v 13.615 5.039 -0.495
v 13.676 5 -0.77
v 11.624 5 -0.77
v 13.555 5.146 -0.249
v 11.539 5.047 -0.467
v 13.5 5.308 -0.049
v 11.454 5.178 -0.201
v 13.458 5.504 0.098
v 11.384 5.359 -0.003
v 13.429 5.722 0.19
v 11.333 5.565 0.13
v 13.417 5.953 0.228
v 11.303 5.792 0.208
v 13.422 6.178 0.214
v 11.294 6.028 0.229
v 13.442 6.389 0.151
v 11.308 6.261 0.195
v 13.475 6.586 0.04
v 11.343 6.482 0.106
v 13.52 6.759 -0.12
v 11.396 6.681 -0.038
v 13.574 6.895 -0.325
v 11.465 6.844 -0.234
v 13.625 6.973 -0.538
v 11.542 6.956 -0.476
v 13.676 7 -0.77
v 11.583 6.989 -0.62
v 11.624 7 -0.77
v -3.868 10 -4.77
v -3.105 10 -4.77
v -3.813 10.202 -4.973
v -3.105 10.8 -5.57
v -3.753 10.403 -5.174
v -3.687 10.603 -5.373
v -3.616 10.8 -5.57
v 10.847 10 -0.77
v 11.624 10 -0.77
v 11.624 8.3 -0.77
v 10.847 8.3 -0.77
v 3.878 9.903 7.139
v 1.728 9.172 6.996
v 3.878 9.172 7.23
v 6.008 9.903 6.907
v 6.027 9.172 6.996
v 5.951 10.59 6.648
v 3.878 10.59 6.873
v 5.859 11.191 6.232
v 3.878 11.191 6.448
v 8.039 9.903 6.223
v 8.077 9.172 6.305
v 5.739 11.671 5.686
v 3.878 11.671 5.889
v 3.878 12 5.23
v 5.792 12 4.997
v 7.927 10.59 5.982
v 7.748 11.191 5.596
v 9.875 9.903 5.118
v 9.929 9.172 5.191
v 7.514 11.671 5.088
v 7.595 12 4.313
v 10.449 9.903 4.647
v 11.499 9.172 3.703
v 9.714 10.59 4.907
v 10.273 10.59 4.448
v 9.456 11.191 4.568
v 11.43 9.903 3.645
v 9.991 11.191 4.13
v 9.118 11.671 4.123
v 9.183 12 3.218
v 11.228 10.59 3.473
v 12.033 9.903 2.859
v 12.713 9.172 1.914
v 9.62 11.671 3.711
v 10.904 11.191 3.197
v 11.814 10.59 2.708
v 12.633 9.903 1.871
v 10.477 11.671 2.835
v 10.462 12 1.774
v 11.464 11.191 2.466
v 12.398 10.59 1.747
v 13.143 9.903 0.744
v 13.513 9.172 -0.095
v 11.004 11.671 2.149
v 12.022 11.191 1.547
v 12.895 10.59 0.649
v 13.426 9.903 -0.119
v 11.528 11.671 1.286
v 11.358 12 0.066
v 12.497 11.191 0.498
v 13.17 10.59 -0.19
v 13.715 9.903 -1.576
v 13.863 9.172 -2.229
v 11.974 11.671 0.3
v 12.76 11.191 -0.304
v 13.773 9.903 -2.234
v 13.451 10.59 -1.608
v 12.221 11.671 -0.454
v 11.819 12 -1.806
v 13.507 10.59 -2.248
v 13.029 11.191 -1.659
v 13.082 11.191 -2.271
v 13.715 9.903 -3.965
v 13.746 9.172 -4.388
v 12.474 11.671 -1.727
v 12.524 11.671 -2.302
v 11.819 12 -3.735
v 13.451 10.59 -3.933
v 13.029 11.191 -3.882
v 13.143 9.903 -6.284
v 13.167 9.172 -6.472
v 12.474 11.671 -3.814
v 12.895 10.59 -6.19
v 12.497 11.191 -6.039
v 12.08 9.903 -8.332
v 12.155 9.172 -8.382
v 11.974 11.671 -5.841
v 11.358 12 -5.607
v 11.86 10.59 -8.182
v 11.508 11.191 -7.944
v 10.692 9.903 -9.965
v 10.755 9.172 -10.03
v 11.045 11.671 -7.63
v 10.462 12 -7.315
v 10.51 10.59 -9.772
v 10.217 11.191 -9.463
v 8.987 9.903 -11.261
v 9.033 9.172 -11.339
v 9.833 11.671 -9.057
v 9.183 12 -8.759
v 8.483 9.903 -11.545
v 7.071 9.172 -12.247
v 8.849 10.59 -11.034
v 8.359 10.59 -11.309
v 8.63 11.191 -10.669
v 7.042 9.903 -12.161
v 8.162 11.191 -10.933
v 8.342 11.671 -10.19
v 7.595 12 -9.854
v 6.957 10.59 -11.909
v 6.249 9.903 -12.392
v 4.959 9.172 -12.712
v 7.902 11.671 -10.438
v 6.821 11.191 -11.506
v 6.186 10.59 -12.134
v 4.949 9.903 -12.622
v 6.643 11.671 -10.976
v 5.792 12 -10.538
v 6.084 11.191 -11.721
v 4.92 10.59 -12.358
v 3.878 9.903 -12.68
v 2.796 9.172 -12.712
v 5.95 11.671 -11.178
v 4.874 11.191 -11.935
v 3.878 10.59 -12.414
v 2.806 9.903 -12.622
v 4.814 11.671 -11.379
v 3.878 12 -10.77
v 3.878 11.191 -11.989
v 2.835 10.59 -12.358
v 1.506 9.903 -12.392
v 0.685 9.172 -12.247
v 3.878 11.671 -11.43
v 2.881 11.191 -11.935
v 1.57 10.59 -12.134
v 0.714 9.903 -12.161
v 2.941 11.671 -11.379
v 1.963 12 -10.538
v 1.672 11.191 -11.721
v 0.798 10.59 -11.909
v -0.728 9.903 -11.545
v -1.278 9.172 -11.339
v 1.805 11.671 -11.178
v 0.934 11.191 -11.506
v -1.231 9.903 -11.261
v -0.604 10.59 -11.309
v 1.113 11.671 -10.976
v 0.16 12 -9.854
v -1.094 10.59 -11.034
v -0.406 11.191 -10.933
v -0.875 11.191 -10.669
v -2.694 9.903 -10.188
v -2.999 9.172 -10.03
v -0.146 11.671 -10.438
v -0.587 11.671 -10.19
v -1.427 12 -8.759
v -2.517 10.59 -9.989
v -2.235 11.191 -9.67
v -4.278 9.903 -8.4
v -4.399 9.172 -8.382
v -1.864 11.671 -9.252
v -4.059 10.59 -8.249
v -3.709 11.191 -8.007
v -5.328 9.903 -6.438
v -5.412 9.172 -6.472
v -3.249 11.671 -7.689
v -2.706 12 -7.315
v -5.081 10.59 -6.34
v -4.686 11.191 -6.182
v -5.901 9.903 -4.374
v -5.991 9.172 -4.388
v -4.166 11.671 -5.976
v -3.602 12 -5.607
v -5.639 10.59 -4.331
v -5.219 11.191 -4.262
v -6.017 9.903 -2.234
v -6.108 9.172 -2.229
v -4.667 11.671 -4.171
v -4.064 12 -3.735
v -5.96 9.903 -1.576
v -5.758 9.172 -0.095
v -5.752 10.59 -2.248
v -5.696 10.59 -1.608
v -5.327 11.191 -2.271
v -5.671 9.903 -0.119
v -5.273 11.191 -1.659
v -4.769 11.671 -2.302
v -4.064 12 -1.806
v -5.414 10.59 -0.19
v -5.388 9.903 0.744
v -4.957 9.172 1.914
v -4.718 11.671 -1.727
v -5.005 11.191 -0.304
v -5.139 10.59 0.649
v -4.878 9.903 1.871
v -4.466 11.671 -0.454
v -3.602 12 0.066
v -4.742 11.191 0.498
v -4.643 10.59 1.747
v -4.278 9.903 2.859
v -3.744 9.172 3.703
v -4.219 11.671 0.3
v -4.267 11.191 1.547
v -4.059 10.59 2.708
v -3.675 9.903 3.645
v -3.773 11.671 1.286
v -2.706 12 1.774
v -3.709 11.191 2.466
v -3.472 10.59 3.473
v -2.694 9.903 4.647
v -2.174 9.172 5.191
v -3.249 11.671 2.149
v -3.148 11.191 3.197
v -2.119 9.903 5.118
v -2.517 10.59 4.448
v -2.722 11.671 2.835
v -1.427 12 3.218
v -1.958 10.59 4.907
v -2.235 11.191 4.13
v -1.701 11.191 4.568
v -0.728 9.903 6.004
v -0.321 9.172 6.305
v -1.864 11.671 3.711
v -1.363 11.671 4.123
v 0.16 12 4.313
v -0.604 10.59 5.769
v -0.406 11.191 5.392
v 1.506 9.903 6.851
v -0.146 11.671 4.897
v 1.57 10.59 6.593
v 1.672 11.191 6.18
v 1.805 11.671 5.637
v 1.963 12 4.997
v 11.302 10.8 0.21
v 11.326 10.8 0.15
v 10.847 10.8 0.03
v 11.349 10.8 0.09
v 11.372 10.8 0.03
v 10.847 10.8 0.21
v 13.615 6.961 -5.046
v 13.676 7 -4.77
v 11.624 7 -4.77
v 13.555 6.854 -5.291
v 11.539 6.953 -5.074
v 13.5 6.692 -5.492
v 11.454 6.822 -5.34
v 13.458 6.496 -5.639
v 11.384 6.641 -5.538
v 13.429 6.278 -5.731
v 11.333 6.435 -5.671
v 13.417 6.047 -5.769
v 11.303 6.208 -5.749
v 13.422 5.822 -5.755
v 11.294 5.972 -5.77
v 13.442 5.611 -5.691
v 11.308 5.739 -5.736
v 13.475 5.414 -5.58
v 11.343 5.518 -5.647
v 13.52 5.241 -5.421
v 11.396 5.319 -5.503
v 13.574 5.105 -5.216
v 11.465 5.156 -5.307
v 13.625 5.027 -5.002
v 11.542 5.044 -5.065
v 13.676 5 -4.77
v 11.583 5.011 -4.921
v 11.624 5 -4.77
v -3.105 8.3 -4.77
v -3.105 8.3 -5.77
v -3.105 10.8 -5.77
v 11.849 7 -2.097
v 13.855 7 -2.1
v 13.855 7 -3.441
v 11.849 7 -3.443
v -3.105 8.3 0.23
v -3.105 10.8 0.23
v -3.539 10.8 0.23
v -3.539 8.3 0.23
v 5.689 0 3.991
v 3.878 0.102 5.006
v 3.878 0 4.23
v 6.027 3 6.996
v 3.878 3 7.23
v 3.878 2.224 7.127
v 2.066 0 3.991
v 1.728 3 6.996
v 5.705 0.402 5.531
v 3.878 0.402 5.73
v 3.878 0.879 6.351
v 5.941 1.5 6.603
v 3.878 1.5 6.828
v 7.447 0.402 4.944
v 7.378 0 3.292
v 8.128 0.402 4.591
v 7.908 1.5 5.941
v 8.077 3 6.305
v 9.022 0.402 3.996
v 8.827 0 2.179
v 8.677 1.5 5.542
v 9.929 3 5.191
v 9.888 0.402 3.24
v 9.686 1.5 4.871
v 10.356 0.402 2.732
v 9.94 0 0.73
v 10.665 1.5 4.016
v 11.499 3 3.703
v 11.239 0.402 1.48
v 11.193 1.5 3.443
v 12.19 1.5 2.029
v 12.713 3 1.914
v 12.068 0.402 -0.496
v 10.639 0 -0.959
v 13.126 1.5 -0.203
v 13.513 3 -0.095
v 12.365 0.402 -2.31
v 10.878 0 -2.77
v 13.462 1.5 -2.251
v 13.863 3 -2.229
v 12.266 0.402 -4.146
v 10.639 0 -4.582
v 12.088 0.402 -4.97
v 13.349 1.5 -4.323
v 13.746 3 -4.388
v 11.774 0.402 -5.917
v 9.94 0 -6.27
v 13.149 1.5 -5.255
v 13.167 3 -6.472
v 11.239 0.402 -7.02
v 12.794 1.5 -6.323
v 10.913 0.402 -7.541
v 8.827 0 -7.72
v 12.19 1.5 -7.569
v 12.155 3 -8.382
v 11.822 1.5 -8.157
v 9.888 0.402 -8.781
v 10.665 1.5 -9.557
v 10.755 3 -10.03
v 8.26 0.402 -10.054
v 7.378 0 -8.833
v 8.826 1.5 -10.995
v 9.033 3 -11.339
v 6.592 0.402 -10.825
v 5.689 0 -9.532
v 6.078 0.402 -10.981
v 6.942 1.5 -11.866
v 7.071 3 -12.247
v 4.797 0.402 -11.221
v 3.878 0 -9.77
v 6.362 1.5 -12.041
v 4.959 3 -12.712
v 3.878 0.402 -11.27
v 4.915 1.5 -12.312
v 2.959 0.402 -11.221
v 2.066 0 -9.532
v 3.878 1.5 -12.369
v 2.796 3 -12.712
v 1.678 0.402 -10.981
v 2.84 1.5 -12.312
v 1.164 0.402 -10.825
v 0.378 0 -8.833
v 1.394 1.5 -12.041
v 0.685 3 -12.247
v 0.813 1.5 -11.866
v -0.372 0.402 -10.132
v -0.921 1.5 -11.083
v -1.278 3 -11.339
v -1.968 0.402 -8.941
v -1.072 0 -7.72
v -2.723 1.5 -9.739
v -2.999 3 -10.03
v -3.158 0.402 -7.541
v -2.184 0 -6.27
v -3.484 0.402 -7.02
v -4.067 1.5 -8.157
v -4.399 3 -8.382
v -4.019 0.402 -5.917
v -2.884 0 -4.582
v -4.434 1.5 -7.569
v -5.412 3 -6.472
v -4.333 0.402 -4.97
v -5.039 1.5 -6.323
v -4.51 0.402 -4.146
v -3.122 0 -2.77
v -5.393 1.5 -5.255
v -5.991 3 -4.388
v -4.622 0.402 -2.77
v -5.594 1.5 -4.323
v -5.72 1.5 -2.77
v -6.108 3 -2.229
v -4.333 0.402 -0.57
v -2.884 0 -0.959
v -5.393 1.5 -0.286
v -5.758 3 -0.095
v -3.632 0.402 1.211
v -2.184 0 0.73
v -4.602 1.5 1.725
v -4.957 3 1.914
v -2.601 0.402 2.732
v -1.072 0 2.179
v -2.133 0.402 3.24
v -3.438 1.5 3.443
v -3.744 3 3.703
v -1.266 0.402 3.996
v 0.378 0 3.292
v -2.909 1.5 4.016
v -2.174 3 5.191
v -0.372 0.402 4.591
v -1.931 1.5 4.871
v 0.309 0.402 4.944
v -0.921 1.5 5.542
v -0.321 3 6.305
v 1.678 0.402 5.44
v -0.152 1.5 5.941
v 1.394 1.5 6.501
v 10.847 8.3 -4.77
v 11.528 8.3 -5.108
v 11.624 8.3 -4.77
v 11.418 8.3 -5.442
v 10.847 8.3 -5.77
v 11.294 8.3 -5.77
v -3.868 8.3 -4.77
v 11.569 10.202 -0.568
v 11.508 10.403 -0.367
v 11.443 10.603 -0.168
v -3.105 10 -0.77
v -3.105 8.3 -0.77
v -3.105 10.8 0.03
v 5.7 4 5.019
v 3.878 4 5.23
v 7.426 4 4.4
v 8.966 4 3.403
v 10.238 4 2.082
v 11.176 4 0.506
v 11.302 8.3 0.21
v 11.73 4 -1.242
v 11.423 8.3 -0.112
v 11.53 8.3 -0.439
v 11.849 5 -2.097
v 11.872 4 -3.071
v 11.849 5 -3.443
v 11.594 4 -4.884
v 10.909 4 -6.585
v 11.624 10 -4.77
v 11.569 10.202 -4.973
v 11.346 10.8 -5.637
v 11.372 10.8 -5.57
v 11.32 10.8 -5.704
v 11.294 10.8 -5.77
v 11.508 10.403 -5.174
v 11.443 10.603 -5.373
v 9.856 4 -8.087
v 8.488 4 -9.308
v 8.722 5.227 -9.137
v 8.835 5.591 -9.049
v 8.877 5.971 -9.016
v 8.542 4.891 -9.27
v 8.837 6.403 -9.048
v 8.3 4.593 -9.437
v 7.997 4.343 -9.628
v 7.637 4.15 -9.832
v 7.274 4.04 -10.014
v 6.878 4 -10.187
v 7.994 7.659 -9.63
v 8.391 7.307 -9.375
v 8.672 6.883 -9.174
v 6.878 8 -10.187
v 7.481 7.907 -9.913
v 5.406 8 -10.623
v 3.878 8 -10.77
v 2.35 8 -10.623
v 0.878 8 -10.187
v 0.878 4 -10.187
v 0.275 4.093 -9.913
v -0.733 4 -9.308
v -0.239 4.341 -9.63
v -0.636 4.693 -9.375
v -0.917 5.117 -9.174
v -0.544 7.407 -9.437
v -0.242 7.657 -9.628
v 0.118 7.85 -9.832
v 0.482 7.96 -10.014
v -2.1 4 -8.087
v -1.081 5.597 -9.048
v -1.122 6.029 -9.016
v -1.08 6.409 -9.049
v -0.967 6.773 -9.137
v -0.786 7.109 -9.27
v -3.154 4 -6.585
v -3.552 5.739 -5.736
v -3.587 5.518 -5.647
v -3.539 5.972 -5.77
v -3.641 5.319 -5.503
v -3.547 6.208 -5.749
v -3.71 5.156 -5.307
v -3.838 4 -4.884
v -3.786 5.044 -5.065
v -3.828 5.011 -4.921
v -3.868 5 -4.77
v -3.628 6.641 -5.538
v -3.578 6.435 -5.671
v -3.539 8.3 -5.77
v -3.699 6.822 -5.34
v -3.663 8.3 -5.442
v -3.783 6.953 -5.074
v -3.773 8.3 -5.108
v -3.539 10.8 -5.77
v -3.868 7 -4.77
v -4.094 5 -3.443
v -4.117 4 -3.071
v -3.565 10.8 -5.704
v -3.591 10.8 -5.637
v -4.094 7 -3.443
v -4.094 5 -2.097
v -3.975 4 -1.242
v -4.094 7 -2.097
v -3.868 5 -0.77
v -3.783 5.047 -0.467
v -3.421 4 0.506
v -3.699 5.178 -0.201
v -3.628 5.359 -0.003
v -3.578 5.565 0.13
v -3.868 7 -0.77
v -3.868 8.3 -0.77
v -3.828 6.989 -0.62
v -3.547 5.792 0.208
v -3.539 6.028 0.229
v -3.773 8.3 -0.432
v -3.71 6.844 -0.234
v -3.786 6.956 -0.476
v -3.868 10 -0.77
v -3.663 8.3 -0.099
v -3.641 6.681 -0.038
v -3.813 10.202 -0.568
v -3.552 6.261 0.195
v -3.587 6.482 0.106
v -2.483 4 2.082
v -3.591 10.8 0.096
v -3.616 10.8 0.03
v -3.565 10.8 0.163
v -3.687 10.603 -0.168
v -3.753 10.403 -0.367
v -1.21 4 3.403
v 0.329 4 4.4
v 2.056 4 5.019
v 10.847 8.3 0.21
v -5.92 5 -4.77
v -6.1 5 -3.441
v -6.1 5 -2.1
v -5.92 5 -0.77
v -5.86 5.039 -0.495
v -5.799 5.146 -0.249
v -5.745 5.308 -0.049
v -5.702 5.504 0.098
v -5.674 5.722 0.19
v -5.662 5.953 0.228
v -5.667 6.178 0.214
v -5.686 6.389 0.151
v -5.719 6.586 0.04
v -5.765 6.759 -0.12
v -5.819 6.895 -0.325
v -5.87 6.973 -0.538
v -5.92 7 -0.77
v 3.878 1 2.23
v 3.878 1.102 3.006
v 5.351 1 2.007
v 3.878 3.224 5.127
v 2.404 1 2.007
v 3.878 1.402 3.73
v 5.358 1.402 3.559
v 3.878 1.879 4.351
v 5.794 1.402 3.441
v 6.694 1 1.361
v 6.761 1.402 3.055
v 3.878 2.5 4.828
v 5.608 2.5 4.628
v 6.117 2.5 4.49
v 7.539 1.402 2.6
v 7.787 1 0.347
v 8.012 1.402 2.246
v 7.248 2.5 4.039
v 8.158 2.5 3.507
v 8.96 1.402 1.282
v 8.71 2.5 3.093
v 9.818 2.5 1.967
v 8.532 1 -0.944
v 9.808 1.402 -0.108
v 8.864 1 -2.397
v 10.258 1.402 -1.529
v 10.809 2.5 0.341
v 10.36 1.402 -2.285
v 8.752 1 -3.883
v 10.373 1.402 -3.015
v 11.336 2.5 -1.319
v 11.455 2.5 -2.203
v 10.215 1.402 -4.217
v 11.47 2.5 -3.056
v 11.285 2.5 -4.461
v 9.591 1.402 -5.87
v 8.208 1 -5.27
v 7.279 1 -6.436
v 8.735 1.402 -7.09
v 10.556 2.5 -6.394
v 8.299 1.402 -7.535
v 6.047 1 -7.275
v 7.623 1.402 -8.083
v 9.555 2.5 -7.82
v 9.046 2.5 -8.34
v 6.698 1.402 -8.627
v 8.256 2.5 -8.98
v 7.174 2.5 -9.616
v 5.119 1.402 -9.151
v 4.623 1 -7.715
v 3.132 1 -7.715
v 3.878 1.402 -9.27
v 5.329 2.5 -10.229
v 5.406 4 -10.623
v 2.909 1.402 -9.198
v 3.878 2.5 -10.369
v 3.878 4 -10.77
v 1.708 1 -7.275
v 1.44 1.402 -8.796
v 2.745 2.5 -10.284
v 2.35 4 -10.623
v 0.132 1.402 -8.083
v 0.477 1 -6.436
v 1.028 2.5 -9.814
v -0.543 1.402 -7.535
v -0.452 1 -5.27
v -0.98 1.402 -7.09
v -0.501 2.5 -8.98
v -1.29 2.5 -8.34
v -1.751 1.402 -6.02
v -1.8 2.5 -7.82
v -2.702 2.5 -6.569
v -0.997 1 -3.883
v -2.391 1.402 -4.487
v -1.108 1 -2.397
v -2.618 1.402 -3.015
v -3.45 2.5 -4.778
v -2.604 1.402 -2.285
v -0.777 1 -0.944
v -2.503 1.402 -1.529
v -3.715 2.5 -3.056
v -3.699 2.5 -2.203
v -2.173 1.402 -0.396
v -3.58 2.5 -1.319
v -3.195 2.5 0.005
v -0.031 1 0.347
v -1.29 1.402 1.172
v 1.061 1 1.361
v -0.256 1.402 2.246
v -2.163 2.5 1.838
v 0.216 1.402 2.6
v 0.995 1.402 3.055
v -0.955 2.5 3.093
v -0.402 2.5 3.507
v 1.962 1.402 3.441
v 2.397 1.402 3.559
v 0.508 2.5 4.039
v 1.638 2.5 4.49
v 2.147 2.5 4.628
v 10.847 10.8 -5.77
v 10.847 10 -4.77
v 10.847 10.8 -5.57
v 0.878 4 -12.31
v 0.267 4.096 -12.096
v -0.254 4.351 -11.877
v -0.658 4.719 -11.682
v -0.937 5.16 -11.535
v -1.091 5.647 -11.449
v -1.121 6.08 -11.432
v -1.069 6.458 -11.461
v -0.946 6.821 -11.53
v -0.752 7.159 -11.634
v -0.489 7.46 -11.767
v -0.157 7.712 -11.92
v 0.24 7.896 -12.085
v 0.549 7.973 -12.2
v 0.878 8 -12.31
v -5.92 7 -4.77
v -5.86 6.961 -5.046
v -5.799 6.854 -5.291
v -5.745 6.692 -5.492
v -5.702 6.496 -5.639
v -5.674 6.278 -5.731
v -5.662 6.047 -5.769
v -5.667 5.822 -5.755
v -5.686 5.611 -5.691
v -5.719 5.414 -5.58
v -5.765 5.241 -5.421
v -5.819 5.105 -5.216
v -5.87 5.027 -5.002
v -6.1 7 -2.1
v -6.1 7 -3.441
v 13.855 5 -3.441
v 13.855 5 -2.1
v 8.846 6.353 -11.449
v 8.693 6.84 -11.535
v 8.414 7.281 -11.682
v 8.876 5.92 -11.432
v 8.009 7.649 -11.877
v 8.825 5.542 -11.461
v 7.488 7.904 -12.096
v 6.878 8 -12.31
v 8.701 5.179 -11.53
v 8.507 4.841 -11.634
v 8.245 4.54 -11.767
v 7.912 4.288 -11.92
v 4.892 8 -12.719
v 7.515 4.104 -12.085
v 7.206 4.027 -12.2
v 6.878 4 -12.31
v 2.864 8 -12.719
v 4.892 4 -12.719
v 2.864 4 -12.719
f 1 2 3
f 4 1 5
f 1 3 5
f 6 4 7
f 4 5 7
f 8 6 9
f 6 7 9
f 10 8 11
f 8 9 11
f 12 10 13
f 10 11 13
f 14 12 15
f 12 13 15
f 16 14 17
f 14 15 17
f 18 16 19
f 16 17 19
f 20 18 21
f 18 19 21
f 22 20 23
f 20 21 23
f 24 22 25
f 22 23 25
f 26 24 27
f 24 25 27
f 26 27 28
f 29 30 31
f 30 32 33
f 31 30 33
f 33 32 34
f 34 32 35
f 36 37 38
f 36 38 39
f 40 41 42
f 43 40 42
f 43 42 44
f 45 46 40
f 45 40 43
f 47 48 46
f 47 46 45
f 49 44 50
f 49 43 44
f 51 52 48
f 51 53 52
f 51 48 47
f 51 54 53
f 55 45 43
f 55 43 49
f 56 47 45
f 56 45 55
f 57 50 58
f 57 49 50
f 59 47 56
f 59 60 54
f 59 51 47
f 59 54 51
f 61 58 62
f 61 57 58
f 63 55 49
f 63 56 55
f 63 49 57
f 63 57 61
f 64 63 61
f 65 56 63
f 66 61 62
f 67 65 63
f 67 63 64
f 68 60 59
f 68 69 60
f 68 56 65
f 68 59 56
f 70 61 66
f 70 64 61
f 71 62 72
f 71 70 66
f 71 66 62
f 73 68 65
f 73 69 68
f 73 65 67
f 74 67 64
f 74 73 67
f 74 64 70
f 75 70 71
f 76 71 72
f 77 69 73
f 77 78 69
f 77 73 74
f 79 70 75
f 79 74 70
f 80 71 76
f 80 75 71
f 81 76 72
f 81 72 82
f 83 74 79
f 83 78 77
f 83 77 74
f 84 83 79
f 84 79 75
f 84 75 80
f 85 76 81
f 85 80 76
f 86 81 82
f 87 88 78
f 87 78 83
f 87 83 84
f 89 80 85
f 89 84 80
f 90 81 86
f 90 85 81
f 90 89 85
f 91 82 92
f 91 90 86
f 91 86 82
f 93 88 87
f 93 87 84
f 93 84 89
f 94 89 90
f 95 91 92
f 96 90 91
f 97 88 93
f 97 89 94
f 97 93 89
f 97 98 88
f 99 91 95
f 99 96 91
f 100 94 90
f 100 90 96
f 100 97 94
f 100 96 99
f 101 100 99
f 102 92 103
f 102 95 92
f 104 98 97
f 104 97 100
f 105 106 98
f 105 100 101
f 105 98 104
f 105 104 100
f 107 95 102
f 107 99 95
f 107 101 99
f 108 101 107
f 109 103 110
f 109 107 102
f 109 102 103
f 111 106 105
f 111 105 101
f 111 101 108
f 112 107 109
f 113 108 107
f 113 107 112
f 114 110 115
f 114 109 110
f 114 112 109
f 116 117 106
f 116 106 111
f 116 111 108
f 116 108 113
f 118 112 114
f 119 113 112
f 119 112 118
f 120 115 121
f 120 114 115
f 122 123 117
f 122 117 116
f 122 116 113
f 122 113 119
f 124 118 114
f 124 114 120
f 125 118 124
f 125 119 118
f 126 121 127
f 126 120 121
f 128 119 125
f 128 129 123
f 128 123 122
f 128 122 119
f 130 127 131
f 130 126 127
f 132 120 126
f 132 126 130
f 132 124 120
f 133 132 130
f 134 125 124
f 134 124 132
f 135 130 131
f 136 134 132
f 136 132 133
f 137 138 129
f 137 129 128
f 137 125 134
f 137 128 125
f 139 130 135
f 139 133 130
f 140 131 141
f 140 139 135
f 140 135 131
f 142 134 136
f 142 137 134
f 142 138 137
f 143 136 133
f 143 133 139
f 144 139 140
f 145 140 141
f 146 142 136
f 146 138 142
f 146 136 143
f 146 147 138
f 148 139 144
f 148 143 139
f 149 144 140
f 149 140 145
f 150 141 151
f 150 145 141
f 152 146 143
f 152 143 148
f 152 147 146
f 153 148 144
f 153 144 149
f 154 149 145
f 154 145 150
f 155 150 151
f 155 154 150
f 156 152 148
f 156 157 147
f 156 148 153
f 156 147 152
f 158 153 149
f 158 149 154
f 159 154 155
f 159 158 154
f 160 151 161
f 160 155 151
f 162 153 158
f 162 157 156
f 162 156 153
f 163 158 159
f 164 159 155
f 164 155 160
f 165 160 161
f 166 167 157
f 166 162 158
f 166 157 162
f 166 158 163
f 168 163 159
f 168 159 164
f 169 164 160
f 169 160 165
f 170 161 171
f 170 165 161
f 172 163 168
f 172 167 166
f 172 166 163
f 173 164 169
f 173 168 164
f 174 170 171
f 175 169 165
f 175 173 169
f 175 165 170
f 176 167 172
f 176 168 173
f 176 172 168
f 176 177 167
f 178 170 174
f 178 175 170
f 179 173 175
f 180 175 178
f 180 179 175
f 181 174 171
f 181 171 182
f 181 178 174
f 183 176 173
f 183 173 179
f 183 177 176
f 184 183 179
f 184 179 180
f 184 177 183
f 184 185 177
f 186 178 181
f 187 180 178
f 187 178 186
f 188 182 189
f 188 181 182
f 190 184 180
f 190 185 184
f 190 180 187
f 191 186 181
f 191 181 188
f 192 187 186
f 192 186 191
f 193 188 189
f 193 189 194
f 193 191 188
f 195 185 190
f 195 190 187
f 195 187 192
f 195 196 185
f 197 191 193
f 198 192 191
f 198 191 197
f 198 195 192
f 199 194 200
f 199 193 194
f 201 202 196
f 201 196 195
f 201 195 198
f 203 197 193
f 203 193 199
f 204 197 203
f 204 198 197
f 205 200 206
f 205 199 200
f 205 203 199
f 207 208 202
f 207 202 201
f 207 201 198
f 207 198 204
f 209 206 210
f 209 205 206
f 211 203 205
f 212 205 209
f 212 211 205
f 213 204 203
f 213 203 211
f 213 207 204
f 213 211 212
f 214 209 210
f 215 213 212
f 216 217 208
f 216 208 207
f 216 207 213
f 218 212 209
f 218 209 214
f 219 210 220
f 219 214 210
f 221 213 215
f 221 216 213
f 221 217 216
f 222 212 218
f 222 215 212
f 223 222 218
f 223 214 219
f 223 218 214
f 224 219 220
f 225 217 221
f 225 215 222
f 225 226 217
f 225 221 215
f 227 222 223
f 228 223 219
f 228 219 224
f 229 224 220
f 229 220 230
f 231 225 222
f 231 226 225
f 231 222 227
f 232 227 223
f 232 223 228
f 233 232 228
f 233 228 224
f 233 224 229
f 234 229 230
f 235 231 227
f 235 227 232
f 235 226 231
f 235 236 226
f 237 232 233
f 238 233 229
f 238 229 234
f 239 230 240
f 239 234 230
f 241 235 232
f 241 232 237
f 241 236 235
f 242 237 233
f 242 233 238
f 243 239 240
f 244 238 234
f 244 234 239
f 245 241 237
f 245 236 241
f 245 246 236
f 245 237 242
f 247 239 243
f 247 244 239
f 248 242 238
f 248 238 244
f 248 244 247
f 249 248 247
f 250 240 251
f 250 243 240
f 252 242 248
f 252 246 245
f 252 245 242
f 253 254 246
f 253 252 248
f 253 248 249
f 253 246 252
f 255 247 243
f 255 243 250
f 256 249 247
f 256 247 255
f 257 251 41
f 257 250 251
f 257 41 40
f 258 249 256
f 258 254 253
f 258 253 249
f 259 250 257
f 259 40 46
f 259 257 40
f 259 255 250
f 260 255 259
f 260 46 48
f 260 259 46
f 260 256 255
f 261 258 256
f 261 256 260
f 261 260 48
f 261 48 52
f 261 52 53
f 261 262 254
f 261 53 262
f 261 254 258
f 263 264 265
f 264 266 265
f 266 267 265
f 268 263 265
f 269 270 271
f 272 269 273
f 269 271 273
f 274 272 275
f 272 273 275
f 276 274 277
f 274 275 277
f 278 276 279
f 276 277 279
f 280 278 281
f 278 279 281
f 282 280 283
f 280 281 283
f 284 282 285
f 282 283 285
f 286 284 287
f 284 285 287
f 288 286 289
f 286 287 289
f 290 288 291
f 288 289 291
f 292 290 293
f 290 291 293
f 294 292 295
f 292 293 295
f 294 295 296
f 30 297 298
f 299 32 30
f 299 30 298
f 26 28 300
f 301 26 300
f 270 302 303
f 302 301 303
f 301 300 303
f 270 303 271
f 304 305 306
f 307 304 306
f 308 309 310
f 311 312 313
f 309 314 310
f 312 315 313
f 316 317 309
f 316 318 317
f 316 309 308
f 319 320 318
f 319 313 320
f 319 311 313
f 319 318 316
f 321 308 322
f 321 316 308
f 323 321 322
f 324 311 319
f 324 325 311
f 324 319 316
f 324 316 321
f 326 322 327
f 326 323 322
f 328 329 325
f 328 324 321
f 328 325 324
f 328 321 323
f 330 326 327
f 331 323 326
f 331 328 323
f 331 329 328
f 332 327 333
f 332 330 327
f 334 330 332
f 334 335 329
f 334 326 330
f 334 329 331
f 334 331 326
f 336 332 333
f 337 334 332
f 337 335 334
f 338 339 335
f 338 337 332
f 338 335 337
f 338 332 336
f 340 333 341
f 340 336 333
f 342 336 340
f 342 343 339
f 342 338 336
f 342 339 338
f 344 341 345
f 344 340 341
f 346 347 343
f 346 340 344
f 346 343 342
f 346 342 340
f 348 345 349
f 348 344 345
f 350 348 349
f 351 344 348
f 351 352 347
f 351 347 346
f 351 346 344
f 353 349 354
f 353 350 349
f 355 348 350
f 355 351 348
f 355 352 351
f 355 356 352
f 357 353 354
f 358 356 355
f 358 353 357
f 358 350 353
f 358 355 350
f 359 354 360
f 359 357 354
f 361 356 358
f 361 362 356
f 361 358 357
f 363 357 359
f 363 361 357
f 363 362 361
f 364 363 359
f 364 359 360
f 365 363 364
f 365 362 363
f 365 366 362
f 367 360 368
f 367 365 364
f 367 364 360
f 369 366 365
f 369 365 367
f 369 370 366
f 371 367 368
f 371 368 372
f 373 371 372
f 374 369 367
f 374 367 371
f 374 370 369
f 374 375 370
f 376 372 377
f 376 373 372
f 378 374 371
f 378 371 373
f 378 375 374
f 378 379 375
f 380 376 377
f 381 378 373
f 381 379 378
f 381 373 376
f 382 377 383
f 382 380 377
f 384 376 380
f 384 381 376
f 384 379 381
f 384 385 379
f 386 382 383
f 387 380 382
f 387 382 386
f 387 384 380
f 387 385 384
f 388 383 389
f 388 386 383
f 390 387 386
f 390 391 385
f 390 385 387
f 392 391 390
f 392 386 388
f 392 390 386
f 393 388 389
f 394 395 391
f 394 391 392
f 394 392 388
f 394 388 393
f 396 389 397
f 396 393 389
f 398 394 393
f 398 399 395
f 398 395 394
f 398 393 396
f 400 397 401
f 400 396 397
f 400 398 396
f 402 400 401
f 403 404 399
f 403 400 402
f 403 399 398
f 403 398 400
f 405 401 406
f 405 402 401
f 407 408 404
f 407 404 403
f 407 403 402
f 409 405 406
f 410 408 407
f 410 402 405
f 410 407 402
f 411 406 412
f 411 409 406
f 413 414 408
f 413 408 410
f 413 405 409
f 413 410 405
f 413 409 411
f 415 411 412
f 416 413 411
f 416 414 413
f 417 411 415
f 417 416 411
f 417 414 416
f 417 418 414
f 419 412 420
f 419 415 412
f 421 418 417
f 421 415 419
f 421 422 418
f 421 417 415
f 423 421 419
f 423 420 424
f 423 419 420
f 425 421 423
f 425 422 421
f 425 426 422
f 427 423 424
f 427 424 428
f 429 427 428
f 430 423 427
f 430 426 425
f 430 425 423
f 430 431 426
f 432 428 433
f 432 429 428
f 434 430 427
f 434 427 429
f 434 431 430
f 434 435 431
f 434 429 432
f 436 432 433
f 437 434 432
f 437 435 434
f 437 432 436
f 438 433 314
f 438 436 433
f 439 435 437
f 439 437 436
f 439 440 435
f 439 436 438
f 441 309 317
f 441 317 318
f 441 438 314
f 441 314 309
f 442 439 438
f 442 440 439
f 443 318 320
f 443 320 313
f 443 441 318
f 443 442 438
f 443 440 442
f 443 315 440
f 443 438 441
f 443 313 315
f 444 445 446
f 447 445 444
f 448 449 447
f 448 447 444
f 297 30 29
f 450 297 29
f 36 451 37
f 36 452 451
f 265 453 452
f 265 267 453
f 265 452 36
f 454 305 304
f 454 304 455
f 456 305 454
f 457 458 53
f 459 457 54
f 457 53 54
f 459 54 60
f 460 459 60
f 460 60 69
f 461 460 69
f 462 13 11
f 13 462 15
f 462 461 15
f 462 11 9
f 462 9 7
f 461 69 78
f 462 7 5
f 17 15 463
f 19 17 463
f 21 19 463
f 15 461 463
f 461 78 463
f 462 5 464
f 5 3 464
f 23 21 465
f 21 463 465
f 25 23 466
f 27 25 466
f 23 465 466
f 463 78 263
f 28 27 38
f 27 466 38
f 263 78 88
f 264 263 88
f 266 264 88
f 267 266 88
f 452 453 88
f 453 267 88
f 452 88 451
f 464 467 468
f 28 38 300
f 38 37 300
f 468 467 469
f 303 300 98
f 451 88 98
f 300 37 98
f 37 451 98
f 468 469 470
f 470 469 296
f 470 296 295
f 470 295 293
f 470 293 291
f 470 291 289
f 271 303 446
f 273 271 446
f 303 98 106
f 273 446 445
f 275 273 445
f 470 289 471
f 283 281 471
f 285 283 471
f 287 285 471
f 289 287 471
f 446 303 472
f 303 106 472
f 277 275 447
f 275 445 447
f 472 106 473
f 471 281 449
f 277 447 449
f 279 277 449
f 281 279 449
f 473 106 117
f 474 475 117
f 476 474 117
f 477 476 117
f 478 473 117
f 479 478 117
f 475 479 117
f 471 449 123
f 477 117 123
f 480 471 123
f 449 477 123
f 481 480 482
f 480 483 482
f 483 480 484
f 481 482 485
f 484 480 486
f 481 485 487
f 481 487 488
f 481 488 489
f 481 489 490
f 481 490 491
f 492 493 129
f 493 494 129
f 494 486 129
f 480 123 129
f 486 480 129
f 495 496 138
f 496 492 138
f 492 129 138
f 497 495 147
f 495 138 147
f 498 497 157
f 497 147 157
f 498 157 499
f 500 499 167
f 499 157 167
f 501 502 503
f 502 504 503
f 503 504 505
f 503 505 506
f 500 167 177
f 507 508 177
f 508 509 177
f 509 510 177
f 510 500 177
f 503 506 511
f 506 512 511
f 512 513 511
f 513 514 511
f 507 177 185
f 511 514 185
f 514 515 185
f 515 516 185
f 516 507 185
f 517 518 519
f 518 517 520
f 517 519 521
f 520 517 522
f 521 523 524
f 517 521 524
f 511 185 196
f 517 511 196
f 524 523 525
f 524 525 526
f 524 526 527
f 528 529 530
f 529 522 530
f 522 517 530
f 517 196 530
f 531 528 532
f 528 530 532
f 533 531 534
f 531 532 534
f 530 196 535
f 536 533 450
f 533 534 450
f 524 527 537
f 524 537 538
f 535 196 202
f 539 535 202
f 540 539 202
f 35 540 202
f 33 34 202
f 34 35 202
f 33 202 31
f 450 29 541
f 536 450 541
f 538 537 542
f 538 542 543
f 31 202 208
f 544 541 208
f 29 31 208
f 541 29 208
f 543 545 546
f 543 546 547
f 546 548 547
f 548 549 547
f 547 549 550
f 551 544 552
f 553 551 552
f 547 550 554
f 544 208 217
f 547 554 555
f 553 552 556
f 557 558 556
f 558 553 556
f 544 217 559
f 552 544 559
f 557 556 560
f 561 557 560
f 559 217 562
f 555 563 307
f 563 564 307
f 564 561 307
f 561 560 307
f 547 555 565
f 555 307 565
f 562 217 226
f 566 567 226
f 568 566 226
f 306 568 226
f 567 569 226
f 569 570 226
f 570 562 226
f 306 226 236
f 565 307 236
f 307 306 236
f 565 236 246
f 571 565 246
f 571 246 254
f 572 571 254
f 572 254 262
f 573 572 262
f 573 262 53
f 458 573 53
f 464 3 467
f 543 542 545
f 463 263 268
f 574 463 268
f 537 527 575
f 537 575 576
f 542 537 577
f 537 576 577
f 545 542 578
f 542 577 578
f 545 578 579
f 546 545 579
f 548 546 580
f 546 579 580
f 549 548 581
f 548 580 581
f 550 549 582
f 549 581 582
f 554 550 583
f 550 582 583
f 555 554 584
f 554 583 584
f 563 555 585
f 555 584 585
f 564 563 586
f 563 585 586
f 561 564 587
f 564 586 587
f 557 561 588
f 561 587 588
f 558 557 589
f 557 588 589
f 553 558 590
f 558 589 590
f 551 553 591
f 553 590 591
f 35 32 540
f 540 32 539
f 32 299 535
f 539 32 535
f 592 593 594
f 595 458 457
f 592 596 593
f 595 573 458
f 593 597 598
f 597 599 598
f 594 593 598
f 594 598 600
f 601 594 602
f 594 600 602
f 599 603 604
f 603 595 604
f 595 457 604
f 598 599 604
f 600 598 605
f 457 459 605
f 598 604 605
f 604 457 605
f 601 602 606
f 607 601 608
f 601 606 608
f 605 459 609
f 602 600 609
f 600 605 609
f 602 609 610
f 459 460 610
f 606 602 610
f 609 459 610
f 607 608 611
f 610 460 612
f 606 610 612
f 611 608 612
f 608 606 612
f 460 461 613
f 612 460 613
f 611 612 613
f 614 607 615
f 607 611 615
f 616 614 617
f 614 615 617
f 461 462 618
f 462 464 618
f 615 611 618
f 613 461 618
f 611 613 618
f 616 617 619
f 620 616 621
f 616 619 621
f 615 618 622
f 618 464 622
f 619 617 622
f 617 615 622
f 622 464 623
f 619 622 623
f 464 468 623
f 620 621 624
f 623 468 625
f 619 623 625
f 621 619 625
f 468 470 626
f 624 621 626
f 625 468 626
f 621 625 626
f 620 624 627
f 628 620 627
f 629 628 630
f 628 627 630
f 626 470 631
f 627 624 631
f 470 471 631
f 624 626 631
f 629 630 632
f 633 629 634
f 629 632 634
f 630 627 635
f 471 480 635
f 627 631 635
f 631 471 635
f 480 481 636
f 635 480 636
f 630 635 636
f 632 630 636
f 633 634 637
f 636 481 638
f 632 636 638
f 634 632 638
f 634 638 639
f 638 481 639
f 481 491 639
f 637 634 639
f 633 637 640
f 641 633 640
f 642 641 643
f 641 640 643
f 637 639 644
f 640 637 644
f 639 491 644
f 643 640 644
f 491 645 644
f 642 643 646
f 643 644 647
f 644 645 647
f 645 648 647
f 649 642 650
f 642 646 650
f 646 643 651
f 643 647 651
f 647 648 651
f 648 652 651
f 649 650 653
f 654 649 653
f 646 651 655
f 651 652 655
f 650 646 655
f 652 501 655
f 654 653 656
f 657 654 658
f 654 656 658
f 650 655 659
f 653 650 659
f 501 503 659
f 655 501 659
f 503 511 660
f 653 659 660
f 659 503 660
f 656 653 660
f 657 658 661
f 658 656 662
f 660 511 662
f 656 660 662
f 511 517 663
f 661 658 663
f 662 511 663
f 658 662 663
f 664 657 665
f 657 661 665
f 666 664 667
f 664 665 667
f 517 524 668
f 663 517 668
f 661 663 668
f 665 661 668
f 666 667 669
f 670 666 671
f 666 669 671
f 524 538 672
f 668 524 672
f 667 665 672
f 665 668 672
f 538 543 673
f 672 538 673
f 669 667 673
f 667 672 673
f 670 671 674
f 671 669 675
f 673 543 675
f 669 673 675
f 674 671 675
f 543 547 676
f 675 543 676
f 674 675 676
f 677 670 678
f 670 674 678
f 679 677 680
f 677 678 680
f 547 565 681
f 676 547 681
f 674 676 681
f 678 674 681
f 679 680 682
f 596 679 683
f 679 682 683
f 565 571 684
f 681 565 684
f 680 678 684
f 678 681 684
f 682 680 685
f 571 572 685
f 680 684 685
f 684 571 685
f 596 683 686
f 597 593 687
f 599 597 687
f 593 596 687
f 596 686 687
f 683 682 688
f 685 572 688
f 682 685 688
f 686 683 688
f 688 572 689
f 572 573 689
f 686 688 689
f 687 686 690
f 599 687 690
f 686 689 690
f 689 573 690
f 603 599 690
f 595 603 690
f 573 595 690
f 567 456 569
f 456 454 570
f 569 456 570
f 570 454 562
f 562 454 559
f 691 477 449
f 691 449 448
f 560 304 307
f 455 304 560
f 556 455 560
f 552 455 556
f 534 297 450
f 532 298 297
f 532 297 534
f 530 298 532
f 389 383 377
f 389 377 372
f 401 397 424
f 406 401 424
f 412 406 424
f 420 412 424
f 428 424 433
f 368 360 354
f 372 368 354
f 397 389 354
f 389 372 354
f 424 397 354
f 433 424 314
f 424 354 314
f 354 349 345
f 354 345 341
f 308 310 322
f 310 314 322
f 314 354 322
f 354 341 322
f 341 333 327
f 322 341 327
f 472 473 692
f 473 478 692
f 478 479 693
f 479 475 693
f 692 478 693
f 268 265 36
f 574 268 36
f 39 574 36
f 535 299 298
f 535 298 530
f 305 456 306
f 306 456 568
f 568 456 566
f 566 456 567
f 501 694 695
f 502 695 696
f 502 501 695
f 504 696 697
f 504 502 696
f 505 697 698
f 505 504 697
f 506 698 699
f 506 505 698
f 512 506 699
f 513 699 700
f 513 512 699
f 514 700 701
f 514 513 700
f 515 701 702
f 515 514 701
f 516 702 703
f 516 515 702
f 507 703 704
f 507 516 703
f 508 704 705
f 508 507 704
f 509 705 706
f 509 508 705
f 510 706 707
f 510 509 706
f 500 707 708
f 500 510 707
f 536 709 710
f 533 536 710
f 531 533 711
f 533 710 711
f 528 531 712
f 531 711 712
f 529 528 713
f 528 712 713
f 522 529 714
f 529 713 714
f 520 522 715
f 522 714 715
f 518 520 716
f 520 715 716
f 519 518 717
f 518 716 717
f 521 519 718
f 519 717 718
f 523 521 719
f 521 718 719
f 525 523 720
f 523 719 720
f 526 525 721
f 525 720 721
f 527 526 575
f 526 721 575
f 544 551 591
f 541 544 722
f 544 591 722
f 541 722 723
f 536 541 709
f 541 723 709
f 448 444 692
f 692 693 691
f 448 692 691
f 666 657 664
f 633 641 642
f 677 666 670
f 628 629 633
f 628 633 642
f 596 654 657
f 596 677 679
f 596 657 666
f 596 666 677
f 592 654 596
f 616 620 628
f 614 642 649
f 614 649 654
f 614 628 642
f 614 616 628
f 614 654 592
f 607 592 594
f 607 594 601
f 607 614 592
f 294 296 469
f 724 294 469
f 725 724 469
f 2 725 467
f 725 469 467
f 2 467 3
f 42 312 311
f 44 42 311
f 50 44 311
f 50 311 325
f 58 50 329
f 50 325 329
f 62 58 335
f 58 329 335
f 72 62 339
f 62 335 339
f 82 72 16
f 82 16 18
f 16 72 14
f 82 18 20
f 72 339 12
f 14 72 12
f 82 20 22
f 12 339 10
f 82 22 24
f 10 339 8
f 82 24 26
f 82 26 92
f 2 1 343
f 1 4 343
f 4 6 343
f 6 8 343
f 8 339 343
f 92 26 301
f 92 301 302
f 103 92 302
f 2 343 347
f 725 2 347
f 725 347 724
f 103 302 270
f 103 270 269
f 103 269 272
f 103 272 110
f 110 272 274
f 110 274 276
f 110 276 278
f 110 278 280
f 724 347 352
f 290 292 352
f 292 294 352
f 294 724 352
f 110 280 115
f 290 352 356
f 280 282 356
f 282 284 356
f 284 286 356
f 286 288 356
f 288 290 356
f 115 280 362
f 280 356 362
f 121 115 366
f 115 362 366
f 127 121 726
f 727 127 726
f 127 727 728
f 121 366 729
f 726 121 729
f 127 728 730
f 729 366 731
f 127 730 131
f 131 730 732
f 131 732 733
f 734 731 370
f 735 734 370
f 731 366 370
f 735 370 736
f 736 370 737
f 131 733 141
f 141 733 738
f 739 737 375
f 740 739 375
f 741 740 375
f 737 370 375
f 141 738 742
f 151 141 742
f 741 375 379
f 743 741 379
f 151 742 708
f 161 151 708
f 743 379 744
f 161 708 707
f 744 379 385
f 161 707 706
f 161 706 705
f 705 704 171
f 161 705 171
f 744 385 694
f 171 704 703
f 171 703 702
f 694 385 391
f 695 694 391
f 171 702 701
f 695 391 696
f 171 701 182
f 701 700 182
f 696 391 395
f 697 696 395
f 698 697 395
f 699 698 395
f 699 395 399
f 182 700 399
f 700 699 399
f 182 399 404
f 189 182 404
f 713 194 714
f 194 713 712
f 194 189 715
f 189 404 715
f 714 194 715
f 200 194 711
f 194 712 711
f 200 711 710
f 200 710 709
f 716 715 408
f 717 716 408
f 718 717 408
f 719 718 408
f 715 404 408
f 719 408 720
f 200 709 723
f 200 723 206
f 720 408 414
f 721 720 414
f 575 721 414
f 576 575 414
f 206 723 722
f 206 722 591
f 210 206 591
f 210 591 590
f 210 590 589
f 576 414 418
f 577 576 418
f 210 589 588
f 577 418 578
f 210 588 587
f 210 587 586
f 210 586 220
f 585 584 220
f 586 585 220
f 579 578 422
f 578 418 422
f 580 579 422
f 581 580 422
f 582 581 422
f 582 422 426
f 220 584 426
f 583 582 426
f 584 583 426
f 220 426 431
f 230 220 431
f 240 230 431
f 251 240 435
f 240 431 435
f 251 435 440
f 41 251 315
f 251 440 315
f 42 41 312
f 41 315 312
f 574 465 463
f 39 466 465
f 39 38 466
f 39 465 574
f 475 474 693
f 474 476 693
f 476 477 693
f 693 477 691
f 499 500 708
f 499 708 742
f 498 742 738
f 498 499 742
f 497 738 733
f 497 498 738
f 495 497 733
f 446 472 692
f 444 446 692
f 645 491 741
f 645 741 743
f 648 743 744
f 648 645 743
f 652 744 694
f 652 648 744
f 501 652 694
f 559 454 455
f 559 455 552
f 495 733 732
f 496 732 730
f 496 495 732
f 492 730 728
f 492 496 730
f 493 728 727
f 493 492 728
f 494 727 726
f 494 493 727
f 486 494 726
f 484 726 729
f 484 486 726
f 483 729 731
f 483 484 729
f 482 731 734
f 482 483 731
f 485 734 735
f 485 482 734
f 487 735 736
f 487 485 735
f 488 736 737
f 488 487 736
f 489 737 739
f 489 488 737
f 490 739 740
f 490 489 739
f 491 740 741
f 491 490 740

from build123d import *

# Parameters (mm, degrees)
SKETCH_1_R               = 10
EXTRUDE_1_DEPTH          = 12
CUT_EXTRUDE_1_DEPTH      = 23.353389068
SKETCH_3_R               = 8
CUT_EXTRUDE_2_DEPTH      = 11
FILLET_1_R               = 3
CUT_EXTRUDE_3_DEPTH      = 23.353389241
CUT_EXTRUDE_3_DEPTH_BACK = 23.353389241
SKETCH_5_W               = 1.508883289
SKETCH_5_H               = 1
SKETCH_5_H_2             = 0.980176719
SKETCH_5_W_2             = 1.789126732
EXTRUDE_3_DEPTH          = 2.5
CHAMFER_2_SIZE           = 0.8


with BuildPart() as part:
    # 草图1 → 凸台-拉伸1 (new body)
    with BuildSketch(Plane(origin=(0, 0, 0), x_dir=(1, 0, 0), z_dir=(0, 1, 0))):
        with Locations(Location((3.877687805, 2.770426149, 0), (0, 0, 270))):
            Circle(SKETCH_1_R)
    extrude(amount=EXTRUDE_1_DEPTH)

    # 草图2 → 切除-拉伸1 (cut, through all)
    with BuildSketch(Plane.XY):
        with BuildLine():
            Line((0.877687805, 8), (6.877687805, 8))
            ThreePointArc((6.877687805, 8), (8.877687805, 6), (6.877687805, 4))
            Line((6.877687805, 4), (0.877687805, 4))
            ThreePointArc((0.877687805, 4), (-1.122312195, 6), (0.877687805, 8))
        make_face()
    extrude(amount=-CUT_EXTRUDE_1_DEPTH, mode=Mode.SUBTRACT)

    # 草图3 → 切除-拉伸2 (cut)
    with BuildSketch(Plane(origin=(0, 12, 0), x_dir=(1, 0, 0), z_dir=(0, 1, 0))):
        with Locations(Location((3.877687805, 2.770426149, 0), (0, 0, 270))):
            Circle(SKETCH_3_R)
    extrude(amount=-CUT_EXTRUDE_2_DEPTH, mode=Mode.SUBTRACT)

    # 圆角1
    # the kernel refuses this fillet: 3 mm, written as the material it adds along each edge
    with BuildSketch(Plane(origin=(3.877687805, 1, -2.770426149), x_dir=(0, 0, 1), z_dir=(-1, 0, 0))) as fillet_1_piece_1:
        with BuildLine():
            CenterArc((8 - FILLET_1_R, FILLET_1_R), FILLET_1_R, 270, 90)
            Line((8 - FILLET_1_R, 0), (8, 0))
            Line((8, 0), (8, FILLET_1_R))
        make_face()
    revolve(axis=Axis((3.877687805, 1, -2.770426149), (0, 1, 0)))
    # the kernel refuses this fillet: 3 mm, written as the material it takes off along each edge
    with BuildSketch(Plane(origin=(3.877687805, 0, -2.770426149), x_dir=(0, 0, 1), z_dir=(-1, 0, 0))) as fillet_1_2_piece_1:
        with BuildLine():
            CenterArc((10 - FILLET_1_R, FILLET_1_R), FILLET_1_R, 270, 90)
            Line((10 - FILLET_1_R, 0), (10, 0))
            Line((10, 0), (10, FILLET_1_R))
        make_face()
    revolve(axis=Axis((3.877687805, 0, -2.770426149), (0, 1, 0)), mode=Mode.SUBTRACT)
    with BuildSketch(Plane(origin=(3.877687805, 12, -2.770426149), x_dir=(0, 0, 1), z_dir=(-1, 0, 0))) as fillet_1_2_piece_2:
        with BuildLine():
            CenterArc((7, -2.828427125), FILLET_1_R, 0, 70.528779366)
            Line((8, 0), (10, 0))
            Line((10, 0), (10, -2.828427125))
        make_face()
    revolve(axis=Axis((3.877687805, 12, -2.770426149), (0, 1, 0)), mode=Mode.SUBTRACT)

    # 草图4 → 切除-拉伸3 (cut, two sides: drawn at the far end of the back side and taken through both)
    with BuildSketch(Plane(origin=(0, 0, 0), x_dir=(0, 0, -1), z_dir=(1, 0, 0)).offset(-CUT_EXTRUDE_3_DEPTH_BACK)):
        with BuildLine():
            Line((0.770426149, 7), (4.770426149, 7))
            ThreePointArc((4.770426149, 7), (5.770426149, 6), (4.770426149, 5))
            Line((4.770426149, 5), (0.770426149, 5))
            ThreePointArc((0.770426149, 5), (-0.229573851, 6), (0.770426149, 7))
        make_face()
    extrude(amount=CUT_EXTRUDE_3_DEPTH + CUT_EXTRUDE_3_DEPTH_BACK, mode=Mode.SUBTRACT)

    # 草图5 → 凸台-拉伸3 (add)
    with BuildSketch(Plane(origin=(0, 10.8, 0), x_dir=(-1, 0, 0), z_dir=(0, -1, 0))):
        with Locations((-11.601062589, 5.270426149)):
            Rectangle(SKETCH_5_W, SKETCH_5_H)
        with Locations((-11.601062589, 0.280337789)):
            Rectangle(SKETCH_5_W, SKETCH_5_H_2)
        with Locations((3.999711661, 5.270426149)):
            Rectangle(SKETCH_5_W_2, SKETCH_5_H)
        with Locations((3.999711661, 0.270426149)):
            Rectangle(SKETCH_5_W_2, SKETCH_5_H)
    extrude(amount=EXTRUDE_3_DEPTH)

    # 倒角2
    chamfer_2_edges = [part.edges().sort_by_distance(p)[0] for p in [
        (11.235137721, 10.8, -0.770426149),
        (-3.486713591, 10.8, -4.770426149),
        (-3.486713591, 10.8, -0.770426149),
        (11.235137721, 10.8, -4.770426149),
    ]]
    chamfer(chamfer_2_edges, length=CHAMFER_2_SIZE)


solid = part.part
